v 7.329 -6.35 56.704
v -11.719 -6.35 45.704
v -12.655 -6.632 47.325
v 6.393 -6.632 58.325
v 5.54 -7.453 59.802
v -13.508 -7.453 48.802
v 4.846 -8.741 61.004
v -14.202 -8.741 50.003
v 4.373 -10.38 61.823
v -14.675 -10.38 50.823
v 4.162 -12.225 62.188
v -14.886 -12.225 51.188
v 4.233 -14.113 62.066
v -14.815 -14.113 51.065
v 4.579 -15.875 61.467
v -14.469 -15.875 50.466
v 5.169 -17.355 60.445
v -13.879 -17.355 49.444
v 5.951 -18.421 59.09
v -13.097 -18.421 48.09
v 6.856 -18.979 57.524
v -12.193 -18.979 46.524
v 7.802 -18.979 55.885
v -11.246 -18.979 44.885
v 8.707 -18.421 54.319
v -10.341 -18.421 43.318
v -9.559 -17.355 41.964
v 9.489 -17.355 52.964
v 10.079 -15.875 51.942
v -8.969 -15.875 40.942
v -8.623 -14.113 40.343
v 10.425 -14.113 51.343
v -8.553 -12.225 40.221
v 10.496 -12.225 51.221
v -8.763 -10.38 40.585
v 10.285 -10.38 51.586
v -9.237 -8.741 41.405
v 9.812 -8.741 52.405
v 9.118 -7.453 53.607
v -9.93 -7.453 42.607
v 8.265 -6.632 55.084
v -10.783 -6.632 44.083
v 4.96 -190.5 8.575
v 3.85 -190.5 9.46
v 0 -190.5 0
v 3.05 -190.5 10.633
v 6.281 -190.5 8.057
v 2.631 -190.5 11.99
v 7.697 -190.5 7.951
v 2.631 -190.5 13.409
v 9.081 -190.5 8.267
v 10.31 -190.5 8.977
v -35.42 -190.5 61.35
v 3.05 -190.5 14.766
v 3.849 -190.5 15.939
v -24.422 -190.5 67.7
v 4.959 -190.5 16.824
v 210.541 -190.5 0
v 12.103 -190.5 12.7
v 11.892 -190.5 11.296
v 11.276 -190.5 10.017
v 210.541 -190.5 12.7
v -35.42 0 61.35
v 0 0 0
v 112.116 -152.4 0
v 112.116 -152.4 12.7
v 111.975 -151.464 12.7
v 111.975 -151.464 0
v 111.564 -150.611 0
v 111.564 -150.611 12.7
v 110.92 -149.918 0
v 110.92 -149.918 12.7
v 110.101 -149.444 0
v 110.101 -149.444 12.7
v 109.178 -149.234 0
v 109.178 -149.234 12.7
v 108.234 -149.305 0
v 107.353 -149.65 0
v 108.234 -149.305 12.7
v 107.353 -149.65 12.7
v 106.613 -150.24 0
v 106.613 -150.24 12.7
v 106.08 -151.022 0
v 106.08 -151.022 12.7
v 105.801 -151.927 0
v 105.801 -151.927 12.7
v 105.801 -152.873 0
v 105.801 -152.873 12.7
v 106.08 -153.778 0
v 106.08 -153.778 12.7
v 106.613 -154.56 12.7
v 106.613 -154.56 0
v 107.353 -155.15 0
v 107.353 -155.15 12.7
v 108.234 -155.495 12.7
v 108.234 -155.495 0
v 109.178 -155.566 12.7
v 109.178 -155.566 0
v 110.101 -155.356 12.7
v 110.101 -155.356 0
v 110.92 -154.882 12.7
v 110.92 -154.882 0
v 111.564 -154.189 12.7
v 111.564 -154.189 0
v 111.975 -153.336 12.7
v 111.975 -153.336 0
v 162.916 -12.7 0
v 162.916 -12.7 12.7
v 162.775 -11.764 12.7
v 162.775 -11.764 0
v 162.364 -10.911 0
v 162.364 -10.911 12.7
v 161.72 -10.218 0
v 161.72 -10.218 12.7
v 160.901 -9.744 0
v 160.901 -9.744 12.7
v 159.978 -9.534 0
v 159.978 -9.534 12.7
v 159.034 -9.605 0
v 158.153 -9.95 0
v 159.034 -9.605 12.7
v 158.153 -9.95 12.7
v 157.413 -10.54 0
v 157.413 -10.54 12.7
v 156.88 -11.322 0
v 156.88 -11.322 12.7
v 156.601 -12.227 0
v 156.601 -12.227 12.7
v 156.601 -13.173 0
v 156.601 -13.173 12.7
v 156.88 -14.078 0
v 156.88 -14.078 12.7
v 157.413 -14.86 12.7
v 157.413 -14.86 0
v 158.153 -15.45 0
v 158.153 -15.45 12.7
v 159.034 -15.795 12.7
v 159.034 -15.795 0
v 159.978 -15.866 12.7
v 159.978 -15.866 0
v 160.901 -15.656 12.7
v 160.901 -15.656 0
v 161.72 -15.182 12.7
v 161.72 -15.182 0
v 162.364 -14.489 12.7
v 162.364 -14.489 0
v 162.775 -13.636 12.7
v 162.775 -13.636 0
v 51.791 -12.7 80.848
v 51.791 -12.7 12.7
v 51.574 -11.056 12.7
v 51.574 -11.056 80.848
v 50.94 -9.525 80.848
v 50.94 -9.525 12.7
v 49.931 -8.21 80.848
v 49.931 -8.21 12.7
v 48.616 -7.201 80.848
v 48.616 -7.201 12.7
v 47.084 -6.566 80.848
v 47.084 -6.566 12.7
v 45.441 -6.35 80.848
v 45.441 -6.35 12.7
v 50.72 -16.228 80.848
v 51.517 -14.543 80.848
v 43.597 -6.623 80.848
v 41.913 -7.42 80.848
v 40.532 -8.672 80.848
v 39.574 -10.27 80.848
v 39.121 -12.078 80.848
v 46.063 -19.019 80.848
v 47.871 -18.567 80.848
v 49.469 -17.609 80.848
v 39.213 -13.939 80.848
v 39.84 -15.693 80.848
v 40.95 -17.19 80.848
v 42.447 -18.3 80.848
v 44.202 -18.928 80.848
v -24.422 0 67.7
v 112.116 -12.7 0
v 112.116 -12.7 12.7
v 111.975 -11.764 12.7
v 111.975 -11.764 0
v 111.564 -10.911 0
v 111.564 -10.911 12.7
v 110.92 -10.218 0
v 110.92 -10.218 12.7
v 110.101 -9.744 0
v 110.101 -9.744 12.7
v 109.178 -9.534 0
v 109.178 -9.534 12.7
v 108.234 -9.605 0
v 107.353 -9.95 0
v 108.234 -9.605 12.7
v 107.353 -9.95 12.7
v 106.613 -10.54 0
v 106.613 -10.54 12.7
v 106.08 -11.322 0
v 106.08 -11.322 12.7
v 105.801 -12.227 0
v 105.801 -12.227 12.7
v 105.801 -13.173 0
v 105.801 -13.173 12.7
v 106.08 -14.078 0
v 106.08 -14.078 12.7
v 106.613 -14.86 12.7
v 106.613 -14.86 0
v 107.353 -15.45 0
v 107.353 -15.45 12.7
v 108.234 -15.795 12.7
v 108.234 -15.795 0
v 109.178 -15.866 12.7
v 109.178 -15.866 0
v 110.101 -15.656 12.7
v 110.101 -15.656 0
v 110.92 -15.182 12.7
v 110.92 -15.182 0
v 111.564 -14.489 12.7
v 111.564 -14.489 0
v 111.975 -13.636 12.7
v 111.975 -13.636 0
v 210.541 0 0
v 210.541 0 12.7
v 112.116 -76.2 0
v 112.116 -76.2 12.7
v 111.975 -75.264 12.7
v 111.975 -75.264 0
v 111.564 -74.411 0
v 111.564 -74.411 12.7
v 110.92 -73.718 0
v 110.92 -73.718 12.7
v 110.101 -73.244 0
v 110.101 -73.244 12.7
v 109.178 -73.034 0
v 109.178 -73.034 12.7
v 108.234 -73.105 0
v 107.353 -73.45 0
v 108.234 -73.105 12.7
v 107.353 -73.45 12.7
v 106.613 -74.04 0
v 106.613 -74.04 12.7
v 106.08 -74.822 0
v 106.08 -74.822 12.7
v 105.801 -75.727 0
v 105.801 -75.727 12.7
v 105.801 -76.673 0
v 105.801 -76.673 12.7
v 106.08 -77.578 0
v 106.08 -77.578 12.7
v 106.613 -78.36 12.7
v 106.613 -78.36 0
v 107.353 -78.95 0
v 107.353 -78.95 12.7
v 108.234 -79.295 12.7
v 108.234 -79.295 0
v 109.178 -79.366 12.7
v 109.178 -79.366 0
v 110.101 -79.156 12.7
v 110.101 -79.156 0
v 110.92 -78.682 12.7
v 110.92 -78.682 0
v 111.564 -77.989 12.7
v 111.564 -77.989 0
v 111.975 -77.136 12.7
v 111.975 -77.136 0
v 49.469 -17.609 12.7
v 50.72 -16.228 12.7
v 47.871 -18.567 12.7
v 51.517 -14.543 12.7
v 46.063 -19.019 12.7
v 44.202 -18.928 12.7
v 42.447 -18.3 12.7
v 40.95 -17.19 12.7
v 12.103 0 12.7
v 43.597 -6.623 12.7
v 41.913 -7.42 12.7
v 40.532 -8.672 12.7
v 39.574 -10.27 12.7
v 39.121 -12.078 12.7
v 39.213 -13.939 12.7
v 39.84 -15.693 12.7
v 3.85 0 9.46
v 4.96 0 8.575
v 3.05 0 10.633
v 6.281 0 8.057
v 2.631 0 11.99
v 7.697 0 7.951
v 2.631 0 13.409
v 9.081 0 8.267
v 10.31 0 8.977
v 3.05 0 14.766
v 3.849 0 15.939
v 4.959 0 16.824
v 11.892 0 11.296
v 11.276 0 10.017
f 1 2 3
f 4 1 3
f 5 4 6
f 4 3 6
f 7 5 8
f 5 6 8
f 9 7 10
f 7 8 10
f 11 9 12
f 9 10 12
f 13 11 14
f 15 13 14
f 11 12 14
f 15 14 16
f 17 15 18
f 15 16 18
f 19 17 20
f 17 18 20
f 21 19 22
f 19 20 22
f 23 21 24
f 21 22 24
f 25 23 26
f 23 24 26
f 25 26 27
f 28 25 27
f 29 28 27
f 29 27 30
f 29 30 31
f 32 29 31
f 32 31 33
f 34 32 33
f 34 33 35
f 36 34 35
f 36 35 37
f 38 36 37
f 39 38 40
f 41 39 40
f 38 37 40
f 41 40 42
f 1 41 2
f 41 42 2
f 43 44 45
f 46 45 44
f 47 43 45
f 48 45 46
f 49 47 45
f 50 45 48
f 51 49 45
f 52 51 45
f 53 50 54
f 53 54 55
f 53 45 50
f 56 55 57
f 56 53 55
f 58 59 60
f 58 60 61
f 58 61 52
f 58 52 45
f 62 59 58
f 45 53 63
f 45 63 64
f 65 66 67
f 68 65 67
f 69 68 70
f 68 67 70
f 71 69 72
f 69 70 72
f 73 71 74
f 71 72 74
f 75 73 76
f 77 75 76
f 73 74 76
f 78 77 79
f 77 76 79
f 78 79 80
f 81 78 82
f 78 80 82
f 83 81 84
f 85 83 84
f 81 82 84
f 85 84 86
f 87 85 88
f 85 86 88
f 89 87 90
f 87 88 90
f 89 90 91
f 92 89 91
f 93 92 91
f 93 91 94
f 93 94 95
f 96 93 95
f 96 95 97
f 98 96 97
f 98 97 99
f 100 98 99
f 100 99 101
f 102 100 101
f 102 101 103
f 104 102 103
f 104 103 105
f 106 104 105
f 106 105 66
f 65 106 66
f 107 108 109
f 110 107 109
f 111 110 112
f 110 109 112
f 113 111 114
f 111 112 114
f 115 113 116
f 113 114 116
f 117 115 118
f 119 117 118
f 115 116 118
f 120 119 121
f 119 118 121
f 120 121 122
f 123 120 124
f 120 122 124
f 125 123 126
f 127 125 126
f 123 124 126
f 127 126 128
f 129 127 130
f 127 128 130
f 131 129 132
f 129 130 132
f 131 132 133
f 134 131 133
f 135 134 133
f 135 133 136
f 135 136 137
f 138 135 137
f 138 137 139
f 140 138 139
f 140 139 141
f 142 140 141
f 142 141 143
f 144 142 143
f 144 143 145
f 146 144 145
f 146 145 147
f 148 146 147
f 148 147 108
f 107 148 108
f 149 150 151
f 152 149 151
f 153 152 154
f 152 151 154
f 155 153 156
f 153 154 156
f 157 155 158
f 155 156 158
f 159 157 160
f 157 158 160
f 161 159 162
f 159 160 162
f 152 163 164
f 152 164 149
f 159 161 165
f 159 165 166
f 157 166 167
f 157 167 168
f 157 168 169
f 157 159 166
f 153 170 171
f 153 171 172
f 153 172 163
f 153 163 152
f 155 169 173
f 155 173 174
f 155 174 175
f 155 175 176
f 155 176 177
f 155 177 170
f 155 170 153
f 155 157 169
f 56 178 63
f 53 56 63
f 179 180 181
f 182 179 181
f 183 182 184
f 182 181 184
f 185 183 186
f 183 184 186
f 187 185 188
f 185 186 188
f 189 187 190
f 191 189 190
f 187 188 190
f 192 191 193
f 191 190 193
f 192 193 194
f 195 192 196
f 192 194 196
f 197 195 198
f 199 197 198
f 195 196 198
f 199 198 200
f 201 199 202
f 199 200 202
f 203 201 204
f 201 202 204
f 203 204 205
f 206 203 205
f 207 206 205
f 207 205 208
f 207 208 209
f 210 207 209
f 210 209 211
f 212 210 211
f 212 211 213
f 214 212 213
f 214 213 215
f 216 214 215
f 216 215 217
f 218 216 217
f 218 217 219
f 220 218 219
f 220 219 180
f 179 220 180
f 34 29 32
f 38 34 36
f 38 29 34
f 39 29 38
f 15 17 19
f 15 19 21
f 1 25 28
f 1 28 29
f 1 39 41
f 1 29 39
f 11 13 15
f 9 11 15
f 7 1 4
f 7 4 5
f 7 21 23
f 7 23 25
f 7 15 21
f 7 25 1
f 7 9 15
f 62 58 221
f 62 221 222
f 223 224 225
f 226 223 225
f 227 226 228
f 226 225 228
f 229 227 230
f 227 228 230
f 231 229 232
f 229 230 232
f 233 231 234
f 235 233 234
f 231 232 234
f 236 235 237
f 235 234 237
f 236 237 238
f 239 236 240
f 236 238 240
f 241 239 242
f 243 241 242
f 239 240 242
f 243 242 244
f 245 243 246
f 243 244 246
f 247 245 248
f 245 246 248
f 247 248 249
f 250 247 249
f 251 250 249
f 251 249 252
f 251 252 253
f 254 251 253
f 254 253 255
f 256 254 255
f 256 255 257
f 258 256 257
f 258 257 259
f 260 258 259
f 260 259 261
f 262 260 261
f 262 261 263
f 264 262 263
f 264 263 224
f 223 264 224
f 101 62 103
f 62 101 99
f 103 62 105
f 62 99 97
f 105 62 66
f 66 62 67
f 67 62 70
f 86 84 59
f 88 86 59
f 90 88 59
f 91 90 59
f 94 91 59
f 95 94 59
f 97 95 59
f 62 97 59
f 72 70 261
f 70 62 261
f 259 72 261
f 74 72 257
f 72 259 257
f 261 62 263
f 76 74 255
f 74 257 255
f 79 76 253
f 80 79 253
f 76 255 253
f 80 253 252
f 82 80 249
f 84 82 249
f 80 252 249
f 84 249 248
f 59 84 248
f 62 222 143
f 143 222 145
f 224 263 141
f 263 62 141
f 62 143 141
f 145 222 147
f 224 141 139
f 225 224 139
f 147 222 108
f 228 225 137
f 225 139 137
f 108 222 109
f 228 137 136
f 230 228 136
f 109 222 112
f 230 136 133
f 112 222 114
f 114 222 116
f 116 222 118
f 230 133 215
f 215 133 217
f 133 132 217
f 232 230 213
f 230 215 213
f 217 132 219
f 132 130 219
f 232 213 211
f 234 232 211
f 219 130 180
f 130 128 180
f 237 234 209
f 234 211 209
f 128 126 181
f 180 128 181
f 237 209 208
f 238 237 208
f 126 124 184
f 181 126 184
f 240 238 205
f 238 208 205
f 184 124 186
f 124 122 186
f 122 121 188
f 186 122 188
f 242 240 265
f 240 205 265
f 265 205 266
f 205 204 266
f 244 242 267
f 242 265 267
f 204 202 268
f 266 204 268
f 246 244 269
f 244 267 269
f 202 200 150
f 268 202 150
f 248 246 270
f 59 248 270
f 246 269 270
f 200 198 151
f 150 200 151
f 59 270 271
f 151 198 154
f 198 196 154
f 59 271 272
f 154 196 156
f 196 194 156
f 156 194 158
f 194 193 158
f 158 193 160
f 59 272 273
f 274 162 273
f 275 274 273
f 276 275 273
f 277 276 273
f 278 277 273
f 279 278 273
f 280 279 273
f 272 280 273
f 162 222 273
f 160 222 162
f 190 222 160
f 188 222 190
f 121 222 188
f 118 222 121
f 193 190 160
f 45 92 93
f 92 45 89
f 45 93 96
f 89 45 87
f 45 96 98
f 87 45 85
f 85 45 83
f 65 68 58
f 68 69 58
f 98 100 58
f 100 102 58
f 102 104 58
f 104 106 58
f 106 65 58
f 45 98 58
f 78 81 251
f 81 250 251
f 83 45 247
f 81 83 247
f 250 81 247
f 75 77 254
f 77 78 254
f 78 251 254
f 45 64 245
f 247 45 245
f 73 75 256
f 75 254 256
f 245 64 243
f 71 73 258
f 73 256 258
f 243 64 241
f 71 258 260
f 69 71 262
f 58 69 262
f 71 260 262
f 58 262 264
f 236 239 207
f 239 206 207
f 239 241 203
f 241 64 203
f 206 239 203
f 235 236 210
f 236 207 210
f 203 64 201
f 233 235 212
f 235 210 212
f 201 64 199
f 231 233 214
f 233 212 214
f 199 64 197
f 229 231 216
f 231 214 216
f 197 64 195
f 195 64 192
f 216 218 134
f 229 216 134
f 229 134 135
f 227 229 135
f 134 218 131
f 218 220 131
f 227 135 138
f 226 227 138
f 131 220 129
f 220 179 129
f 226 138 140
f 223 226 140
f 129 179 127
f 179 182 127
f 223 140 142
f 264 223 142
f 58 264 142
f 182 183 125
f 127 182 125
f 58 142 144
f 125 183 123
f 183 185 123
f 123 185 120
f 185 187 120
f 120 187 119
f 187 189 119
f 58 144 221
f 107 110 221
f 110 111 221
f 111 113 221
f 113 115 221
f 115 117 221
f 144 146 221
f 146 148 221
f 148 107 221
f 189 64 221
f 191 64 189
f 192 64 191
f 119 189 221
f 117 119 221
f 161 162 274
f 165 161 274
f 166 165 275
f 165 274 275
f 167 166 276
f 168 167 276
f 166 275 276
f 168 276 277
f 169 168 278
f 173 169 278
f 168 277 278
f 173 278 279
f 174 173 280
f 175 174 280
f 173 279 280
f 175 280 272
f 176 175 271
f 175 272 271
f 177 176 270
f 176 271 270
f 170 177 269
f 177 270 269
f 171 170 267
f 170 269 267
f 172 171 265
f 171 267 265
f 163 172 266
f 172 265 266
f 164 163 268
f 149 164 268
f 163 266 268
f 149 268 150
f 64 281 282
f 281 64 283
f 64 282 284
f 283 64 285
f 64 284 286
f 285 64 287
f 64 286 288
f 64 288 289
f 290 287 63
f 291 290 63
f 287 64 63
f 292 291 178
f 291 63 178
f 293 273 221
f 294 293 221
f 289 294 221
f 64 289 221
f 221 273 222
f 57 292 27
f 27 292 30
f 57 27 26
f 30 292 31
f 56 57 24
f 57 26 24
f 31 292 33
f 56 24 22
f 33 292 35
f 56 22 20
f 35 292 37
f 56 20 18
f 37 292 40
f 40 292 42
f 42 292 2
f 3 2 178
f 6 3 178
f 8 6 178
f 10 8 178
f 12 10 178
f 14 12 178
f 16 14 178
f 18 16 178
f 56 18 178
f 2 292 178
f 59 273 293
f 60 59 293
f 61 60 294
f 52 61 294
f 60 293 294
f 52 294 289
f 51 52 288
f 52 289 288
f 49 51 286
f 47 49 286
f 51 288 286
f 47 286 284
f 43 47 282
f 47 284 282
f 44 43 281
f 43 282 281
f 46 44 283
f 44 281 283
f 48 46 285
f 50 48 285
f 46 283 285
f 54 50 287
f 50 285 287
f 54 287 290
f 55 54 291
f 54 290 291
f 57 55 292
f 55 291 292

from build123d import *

# Parameters (mm, degrees)
F1_DEPTH = 190.5
F2_R     = 3.175
F3_DEPTH = 25.4
F5_DEPTH = 68.1482
F6_R     = 6.35
F7_DEPTH = 21.9964


with BuildPart() as f1:
    # F0 (on Front) → F1 (new body)
    with BuildSketch(Plane.XZ):
        with BuildLine():
            Line((-35.4203, 61.3497592193), (0, 0))
            Line((0, 0), (7.3406, 0))
            Line((7.3406, 0), (210.5406, 0))
            Line((210.5406, 0), (210.5406, 12.7))
            Line((210.5406, 12.7), (12.1031, 12.7))
            ThreePointArc((12.1031, 12.7), (4.9595820343, 8.5754200581), (4.9588859541, 16.8241780337))
            Line((4.9588859541, 16.8241780337), (-24.4217773719, 67.6997592193))
            Line((-24.4217773719, 67.6997592193), (-35.4203, 61.3497592193))
        make_face()
    extrude(amount=F1_DEPTH)

    # F2 (on face) → F3 (cut)
    with BuildSketch(Plane.XY.offset(12.7)):
        with Locations((108.9406, -12.7)):
            Circle(F2_R)
        with Locations((108.9406, -76.2)):
            Circle(F2_R)
        with Locations((159.7406, -12.7)):
            Circle(F2_R)
        with Locations((108.9406, -152.4)):
            Circle(F2_R)
    extrude(amount=-F3_DEPTH, mode=Mode.SUBTRACT)

    # F4 (on face) → F5 (join)
    with BuildSketch(Plane.XY.offset(12.7)):
        with BuildLine():
            ThreePointArc((51.7906, -12.7), (49.9307280605, -8.2098719395), (45.4406, -6.35))
            Line((45.4406, -6.35), (45.4406, -12.7))
            Line((45.4406, -12.7), (51.7906, -12.7))
        make_face()
        with BuildLine():
            Line((45.4406, -12.7), (45.4406, -6.35))
            ThreePointArc((45.4406, -6.35), (40.9504719395, -17.1901280605), (51.7906, -12.7))
            Line((51.7906, -12.7), (45.4406, -12.7))
        make_face()
    extrude(amount=F5_DEPTH)

    # F6 (on face) → F7 (join)
    with BuildSketch(Plane(origin=(11.0047103243, 0, 6.3552234983), x_dir=(0, 1, 0), z_dir=(0.8659691409, 0, 0.5000974375))):
        with Locations((-12.7, 45.4391706143)):
            Circle(F6_R)
    extrude(amount=F7_DEPTH)


solid = f1.part
